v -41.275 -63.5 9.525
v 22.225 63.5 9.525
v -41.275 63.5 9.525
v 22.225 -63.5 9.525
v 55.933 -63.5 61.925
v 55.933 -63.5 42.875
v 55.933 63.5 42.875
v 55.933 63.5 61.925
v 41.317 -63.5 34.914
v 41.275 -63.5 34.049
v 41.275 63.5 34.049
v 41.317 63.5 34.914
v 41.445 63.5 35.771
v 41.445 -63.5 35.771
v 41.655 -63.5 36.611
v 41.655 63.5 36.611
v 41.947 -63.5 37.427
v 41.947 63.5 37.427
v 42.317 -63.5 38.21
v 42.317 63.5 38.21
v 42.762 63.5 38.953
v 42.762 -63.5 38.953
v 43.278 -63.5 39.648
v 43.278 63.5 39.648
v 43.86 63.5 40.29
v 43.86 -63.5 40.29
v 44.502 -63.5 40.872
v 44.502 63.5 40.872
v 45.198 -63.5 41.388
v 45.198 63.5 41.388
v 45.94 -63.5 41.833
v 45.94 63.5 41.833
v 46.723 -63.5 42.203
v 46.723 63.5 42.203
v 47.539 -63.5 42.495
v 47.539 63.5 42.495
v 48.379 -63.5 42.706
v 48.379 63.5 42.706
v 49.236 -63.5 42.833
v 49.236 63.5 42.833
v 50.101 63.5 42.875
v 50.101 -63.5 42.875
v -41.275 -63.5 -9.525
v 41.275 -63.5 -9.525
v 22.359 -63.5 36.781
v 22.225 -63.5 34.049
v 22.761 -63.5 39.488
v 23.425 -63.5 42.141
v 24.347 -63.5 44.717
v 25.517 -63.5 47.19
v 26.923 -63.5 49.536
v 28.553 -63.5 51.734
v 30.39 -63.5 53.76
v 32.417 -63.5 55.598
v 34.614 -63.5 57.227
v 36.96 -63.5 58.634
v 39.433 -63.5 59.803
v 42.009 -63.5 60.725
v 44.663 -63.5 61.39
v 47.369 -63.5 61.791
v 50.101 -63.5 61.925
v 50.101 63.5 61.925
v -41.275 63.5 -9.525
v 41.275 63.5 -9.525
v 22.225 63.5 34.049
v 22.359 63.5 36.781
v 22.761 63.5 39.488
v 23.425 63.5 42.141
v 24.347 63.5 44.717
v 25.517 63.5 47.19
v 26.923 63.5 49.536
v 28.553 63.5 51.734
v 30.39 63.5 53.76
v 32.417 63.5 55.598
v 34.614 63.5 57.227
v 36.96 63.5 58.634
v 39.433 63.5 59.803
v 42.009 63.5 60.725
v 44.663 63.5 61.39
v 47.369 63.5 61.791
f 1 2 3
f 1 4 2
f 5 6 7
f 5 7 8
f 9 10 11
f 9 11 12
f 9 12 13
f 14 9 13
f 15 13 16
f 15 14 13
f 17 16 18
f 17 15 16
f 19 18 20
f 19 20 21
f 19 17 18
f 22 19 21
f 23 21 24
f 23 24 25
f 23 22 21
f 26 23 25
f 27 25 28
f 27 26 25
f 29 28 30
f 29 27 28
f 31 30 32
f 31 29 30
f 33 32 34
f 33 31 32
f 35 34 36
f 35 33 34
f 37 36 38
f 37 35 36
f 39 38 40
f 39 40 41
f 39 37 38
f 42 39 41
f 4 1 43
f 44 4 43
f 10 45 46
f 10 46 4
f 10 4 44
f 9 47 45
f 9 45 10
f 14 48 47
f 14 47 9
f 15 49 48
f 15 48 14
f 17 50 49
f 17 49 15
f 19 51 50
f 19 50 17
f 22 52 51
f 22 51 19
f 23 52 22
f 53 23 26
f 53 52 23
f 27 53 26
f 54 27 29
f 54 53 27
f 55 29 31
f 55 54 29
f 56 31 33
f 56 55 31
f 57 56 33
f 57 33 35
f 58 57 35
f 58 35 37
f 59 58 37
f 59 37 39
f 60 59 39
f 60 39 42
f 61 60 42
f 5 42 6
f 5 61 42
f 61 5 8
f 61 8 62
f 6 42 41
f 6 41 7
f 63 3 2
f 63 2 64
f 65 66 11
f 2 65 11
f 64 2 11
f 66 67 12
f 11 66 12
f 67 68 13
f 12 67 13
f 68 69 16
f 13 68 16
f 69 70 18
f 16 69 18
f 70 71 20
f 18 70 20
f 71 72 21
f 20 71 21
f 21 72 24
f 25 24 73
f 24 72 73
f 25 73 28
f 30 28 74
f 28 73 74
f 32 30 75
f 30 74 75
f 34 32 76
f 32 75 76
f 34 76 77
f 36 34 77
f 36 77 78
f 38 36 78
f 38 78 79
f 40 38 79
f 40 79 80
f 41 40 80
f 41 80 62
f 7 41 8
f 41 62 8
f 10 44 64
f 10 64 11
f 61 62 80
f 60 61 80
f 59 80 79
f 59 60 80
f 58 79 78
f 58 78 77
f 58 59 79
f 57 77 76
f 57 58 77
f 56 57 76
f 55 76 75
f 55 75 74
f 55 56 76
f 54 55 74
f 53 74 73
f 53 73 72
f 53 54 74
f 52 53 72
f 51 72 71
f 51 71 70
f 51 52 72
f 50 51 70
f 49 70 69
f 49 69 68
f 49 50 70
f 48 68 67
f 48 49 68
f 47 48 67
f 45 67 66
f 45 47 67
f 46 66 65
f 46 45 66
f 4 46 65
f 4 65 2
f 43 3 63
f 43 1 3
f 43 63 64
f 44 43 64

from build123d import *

# Parameters (mm, degrees)
F1_DEPTH = 63.5


with BuildPart() as f1:
    # F0 (on Front) → F1 (new body, symmetric)
    with BuildSketch(Plane.XZ):
        Polygon((-41.275, -9.525), (41.275, -9.525), (41.275, 9.525), (22.225, 9.525), (-41.275, 9.525), align=None)
        with BuildLine():
            Line((22.225, 9.525), (41.275, 9.525))
            Line((41.275, 9.525), (41.275, 34.049165))
            ThreePointArc((41.275, 34.049165), (43.860086, 40.290114), (50.101035, 42.8752))
            Line((50.101035, 42.8752), (55.933417, 42.8752))
            Line((55.933417, 42.8752), (55.933417, 61.9252))
            Line((55.933417, 61.9252), (50.101035, 61.9252))
            ThreePointArc((50.101035, 61.9252), (30.389702, 53.760498), (22.225, 34.049165))
            Line((22.225, 34.049165), (22.225, 9.525))
        make_face()
    extrude(amount=F1_DEPTH, both=True)


solid = f1.part
